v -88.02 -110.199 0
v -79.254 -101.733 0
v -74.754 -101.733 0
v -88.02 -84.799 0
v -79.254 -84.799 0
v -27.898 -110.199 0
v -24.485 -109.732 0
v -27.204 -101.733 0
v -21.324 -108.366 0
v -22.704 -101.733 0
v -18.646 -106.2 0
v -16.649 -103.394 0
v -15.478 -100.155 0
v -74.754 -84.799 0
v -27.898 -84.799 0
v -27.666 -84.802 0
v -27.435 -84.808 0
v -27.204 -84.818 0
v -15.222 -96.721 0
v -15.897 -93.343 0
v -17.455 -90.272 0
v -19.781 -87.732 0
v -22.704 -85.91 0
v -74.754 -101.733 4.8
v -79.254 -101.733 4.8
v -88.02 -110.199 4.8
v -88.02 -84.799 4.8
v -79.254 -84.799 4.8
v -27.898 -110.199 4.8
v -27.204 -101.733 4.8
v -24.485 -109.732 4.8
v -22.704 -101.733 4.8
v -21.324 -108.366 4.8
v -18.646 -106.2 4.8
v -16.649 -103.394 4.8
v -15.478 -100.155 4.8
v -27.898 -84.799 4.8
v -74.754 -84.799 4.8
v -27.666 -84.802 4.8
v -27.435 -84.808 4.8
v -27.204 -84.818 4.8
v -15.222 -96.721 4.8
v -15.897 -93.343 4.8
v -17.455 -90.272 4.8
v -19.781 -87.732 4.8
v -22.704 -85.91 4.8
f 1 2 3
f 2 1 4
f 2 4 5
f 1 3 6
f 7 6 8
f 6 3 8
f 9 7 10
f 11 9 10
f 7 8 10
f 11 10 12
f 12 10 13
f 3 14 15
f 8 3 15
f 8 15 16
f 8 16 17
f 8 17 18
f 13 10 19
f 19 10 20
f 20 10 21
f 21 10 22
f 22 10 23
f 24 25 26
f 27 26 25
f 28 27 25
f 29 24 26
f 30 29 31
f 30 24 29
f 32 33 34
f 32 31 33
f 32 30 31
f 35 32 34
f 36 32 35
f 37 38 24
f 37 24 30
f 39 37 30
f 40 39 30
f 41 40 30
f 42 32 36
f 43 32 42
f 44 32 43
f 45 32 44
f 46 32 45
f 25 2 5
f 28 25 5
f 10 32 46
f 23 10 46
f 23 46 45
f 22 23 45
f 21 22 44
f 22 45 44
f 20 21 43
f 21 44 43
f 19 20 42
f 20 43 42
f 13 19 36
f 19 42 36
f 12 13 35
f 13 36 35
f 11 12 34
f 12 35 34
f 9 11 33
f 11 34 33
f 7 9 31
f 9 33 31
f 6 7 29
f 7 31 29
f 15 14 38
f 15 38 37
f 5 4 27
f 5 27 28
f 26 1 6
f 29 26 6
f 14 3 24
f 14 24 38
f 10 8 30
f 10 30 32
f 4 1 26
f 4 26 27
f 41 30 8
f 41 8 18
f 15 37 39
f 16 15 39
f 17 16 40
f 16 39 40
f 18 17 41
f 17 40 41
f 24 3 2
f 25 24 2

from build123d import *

# Parameters (mm, degrees)
SKETCH1_W           = 76.2
SKETCH1_H           = 25.4
BOSS_EXTRUDE1_DEPTH = 4.800000052
CUT_EXTRUDE2_DEPTH  = 142.571180171
SKETCH2_W           = 4.500000144
SKETCH2_H           = 16.933333333
CUT_EXTRUDE3_DEPTH  = 142.571180171
SKETCH7_W           = 4.500000144
SKETCH7_H           = 16.933333333
CUT_EXTRUDE4_DEPTH  = 142.571180171
SKETCH8_W           = 0.723333241
SKETCH8_H           = 25.4
CUT_EXTRUDE5_DEPTH  = 142.571180171


with BuildPart() as part:
    # Sketch1 → Boss-Extrude1 (new body)
    with BuildSketch(Plane.XY):
        with Locations((-50.643719603, -97.499415994)):
            Rectangle(SKETCH1_W, SKETCH1_H)
    extrude(amount=BOSS_EXTRUDE1_DEPTH)

    # Sketch6 → Cut-Extrude2 (cut, through all)
    with BuildSketch(Plane.XY.offset(4.800000052)):
        with BuildLine():
            Line((-27.897719629, -110.199415994), (-12.543719603, -110.199415994))
            Line((-12.543719603, -110.199415994), (-12.543719603, -84.799415994))
            Line((-12.543719603, -84.799415994), (-27.897719629, -84.799415994))
            ThreePointArc((-27.897719629, -84.799415994), (-15.197719629, -97.499415994), (-27.897719629, -110.199415994))
        make_face()
    extrude(amount=-CUT_EXTRUDE2_DEPTH, mode=Mode.SUBTRACT)

    # Sketch2 → Cut-Extrude3 (cut, through all)
    with BuildSketch(Plane.XY.offset(4.800000052)):
        with Locations((-24.953719675, -93.266082661)):
            Rectangle(SKETCH2_W, SKETCH2_H)
    extrude(amount=-CUT_EXTRUDE3_DEPTH, mode=Mode.SUBTRACT)

    # Sketch7 → Cut-Extrude4 (cut, through all)
    with BuildSketch(Plane(origin=(0, 0, 0), x_dir=(-1, 0, 0), z_dir=(0, 0, -1))):
        with Locations((77.003719715, -93.266082661)):
            Rectangle(SKETCH7_W, SKETCH7_H)
    extrude(amount=-CUT_EXTRUDE4_DEPTH, mode=Mode.SUBTRACT)

    # Sketch8 → Cut-Extrude5 (cut, through all)
    with BuildSketch(Plane(origin=(0, 0, 0), x_dir=(-1, 0, 0), z_dir=(0, 0, -1))):
        with Locations((88.382052982, -97.499415994)):
            Rectangle(SKETCH8_W, SKETCH8_H)
    extrude(amount=-CUT_EXTRUDE5_DEPTH, mode=Mode.SUBTRACT)


solid = part.part
